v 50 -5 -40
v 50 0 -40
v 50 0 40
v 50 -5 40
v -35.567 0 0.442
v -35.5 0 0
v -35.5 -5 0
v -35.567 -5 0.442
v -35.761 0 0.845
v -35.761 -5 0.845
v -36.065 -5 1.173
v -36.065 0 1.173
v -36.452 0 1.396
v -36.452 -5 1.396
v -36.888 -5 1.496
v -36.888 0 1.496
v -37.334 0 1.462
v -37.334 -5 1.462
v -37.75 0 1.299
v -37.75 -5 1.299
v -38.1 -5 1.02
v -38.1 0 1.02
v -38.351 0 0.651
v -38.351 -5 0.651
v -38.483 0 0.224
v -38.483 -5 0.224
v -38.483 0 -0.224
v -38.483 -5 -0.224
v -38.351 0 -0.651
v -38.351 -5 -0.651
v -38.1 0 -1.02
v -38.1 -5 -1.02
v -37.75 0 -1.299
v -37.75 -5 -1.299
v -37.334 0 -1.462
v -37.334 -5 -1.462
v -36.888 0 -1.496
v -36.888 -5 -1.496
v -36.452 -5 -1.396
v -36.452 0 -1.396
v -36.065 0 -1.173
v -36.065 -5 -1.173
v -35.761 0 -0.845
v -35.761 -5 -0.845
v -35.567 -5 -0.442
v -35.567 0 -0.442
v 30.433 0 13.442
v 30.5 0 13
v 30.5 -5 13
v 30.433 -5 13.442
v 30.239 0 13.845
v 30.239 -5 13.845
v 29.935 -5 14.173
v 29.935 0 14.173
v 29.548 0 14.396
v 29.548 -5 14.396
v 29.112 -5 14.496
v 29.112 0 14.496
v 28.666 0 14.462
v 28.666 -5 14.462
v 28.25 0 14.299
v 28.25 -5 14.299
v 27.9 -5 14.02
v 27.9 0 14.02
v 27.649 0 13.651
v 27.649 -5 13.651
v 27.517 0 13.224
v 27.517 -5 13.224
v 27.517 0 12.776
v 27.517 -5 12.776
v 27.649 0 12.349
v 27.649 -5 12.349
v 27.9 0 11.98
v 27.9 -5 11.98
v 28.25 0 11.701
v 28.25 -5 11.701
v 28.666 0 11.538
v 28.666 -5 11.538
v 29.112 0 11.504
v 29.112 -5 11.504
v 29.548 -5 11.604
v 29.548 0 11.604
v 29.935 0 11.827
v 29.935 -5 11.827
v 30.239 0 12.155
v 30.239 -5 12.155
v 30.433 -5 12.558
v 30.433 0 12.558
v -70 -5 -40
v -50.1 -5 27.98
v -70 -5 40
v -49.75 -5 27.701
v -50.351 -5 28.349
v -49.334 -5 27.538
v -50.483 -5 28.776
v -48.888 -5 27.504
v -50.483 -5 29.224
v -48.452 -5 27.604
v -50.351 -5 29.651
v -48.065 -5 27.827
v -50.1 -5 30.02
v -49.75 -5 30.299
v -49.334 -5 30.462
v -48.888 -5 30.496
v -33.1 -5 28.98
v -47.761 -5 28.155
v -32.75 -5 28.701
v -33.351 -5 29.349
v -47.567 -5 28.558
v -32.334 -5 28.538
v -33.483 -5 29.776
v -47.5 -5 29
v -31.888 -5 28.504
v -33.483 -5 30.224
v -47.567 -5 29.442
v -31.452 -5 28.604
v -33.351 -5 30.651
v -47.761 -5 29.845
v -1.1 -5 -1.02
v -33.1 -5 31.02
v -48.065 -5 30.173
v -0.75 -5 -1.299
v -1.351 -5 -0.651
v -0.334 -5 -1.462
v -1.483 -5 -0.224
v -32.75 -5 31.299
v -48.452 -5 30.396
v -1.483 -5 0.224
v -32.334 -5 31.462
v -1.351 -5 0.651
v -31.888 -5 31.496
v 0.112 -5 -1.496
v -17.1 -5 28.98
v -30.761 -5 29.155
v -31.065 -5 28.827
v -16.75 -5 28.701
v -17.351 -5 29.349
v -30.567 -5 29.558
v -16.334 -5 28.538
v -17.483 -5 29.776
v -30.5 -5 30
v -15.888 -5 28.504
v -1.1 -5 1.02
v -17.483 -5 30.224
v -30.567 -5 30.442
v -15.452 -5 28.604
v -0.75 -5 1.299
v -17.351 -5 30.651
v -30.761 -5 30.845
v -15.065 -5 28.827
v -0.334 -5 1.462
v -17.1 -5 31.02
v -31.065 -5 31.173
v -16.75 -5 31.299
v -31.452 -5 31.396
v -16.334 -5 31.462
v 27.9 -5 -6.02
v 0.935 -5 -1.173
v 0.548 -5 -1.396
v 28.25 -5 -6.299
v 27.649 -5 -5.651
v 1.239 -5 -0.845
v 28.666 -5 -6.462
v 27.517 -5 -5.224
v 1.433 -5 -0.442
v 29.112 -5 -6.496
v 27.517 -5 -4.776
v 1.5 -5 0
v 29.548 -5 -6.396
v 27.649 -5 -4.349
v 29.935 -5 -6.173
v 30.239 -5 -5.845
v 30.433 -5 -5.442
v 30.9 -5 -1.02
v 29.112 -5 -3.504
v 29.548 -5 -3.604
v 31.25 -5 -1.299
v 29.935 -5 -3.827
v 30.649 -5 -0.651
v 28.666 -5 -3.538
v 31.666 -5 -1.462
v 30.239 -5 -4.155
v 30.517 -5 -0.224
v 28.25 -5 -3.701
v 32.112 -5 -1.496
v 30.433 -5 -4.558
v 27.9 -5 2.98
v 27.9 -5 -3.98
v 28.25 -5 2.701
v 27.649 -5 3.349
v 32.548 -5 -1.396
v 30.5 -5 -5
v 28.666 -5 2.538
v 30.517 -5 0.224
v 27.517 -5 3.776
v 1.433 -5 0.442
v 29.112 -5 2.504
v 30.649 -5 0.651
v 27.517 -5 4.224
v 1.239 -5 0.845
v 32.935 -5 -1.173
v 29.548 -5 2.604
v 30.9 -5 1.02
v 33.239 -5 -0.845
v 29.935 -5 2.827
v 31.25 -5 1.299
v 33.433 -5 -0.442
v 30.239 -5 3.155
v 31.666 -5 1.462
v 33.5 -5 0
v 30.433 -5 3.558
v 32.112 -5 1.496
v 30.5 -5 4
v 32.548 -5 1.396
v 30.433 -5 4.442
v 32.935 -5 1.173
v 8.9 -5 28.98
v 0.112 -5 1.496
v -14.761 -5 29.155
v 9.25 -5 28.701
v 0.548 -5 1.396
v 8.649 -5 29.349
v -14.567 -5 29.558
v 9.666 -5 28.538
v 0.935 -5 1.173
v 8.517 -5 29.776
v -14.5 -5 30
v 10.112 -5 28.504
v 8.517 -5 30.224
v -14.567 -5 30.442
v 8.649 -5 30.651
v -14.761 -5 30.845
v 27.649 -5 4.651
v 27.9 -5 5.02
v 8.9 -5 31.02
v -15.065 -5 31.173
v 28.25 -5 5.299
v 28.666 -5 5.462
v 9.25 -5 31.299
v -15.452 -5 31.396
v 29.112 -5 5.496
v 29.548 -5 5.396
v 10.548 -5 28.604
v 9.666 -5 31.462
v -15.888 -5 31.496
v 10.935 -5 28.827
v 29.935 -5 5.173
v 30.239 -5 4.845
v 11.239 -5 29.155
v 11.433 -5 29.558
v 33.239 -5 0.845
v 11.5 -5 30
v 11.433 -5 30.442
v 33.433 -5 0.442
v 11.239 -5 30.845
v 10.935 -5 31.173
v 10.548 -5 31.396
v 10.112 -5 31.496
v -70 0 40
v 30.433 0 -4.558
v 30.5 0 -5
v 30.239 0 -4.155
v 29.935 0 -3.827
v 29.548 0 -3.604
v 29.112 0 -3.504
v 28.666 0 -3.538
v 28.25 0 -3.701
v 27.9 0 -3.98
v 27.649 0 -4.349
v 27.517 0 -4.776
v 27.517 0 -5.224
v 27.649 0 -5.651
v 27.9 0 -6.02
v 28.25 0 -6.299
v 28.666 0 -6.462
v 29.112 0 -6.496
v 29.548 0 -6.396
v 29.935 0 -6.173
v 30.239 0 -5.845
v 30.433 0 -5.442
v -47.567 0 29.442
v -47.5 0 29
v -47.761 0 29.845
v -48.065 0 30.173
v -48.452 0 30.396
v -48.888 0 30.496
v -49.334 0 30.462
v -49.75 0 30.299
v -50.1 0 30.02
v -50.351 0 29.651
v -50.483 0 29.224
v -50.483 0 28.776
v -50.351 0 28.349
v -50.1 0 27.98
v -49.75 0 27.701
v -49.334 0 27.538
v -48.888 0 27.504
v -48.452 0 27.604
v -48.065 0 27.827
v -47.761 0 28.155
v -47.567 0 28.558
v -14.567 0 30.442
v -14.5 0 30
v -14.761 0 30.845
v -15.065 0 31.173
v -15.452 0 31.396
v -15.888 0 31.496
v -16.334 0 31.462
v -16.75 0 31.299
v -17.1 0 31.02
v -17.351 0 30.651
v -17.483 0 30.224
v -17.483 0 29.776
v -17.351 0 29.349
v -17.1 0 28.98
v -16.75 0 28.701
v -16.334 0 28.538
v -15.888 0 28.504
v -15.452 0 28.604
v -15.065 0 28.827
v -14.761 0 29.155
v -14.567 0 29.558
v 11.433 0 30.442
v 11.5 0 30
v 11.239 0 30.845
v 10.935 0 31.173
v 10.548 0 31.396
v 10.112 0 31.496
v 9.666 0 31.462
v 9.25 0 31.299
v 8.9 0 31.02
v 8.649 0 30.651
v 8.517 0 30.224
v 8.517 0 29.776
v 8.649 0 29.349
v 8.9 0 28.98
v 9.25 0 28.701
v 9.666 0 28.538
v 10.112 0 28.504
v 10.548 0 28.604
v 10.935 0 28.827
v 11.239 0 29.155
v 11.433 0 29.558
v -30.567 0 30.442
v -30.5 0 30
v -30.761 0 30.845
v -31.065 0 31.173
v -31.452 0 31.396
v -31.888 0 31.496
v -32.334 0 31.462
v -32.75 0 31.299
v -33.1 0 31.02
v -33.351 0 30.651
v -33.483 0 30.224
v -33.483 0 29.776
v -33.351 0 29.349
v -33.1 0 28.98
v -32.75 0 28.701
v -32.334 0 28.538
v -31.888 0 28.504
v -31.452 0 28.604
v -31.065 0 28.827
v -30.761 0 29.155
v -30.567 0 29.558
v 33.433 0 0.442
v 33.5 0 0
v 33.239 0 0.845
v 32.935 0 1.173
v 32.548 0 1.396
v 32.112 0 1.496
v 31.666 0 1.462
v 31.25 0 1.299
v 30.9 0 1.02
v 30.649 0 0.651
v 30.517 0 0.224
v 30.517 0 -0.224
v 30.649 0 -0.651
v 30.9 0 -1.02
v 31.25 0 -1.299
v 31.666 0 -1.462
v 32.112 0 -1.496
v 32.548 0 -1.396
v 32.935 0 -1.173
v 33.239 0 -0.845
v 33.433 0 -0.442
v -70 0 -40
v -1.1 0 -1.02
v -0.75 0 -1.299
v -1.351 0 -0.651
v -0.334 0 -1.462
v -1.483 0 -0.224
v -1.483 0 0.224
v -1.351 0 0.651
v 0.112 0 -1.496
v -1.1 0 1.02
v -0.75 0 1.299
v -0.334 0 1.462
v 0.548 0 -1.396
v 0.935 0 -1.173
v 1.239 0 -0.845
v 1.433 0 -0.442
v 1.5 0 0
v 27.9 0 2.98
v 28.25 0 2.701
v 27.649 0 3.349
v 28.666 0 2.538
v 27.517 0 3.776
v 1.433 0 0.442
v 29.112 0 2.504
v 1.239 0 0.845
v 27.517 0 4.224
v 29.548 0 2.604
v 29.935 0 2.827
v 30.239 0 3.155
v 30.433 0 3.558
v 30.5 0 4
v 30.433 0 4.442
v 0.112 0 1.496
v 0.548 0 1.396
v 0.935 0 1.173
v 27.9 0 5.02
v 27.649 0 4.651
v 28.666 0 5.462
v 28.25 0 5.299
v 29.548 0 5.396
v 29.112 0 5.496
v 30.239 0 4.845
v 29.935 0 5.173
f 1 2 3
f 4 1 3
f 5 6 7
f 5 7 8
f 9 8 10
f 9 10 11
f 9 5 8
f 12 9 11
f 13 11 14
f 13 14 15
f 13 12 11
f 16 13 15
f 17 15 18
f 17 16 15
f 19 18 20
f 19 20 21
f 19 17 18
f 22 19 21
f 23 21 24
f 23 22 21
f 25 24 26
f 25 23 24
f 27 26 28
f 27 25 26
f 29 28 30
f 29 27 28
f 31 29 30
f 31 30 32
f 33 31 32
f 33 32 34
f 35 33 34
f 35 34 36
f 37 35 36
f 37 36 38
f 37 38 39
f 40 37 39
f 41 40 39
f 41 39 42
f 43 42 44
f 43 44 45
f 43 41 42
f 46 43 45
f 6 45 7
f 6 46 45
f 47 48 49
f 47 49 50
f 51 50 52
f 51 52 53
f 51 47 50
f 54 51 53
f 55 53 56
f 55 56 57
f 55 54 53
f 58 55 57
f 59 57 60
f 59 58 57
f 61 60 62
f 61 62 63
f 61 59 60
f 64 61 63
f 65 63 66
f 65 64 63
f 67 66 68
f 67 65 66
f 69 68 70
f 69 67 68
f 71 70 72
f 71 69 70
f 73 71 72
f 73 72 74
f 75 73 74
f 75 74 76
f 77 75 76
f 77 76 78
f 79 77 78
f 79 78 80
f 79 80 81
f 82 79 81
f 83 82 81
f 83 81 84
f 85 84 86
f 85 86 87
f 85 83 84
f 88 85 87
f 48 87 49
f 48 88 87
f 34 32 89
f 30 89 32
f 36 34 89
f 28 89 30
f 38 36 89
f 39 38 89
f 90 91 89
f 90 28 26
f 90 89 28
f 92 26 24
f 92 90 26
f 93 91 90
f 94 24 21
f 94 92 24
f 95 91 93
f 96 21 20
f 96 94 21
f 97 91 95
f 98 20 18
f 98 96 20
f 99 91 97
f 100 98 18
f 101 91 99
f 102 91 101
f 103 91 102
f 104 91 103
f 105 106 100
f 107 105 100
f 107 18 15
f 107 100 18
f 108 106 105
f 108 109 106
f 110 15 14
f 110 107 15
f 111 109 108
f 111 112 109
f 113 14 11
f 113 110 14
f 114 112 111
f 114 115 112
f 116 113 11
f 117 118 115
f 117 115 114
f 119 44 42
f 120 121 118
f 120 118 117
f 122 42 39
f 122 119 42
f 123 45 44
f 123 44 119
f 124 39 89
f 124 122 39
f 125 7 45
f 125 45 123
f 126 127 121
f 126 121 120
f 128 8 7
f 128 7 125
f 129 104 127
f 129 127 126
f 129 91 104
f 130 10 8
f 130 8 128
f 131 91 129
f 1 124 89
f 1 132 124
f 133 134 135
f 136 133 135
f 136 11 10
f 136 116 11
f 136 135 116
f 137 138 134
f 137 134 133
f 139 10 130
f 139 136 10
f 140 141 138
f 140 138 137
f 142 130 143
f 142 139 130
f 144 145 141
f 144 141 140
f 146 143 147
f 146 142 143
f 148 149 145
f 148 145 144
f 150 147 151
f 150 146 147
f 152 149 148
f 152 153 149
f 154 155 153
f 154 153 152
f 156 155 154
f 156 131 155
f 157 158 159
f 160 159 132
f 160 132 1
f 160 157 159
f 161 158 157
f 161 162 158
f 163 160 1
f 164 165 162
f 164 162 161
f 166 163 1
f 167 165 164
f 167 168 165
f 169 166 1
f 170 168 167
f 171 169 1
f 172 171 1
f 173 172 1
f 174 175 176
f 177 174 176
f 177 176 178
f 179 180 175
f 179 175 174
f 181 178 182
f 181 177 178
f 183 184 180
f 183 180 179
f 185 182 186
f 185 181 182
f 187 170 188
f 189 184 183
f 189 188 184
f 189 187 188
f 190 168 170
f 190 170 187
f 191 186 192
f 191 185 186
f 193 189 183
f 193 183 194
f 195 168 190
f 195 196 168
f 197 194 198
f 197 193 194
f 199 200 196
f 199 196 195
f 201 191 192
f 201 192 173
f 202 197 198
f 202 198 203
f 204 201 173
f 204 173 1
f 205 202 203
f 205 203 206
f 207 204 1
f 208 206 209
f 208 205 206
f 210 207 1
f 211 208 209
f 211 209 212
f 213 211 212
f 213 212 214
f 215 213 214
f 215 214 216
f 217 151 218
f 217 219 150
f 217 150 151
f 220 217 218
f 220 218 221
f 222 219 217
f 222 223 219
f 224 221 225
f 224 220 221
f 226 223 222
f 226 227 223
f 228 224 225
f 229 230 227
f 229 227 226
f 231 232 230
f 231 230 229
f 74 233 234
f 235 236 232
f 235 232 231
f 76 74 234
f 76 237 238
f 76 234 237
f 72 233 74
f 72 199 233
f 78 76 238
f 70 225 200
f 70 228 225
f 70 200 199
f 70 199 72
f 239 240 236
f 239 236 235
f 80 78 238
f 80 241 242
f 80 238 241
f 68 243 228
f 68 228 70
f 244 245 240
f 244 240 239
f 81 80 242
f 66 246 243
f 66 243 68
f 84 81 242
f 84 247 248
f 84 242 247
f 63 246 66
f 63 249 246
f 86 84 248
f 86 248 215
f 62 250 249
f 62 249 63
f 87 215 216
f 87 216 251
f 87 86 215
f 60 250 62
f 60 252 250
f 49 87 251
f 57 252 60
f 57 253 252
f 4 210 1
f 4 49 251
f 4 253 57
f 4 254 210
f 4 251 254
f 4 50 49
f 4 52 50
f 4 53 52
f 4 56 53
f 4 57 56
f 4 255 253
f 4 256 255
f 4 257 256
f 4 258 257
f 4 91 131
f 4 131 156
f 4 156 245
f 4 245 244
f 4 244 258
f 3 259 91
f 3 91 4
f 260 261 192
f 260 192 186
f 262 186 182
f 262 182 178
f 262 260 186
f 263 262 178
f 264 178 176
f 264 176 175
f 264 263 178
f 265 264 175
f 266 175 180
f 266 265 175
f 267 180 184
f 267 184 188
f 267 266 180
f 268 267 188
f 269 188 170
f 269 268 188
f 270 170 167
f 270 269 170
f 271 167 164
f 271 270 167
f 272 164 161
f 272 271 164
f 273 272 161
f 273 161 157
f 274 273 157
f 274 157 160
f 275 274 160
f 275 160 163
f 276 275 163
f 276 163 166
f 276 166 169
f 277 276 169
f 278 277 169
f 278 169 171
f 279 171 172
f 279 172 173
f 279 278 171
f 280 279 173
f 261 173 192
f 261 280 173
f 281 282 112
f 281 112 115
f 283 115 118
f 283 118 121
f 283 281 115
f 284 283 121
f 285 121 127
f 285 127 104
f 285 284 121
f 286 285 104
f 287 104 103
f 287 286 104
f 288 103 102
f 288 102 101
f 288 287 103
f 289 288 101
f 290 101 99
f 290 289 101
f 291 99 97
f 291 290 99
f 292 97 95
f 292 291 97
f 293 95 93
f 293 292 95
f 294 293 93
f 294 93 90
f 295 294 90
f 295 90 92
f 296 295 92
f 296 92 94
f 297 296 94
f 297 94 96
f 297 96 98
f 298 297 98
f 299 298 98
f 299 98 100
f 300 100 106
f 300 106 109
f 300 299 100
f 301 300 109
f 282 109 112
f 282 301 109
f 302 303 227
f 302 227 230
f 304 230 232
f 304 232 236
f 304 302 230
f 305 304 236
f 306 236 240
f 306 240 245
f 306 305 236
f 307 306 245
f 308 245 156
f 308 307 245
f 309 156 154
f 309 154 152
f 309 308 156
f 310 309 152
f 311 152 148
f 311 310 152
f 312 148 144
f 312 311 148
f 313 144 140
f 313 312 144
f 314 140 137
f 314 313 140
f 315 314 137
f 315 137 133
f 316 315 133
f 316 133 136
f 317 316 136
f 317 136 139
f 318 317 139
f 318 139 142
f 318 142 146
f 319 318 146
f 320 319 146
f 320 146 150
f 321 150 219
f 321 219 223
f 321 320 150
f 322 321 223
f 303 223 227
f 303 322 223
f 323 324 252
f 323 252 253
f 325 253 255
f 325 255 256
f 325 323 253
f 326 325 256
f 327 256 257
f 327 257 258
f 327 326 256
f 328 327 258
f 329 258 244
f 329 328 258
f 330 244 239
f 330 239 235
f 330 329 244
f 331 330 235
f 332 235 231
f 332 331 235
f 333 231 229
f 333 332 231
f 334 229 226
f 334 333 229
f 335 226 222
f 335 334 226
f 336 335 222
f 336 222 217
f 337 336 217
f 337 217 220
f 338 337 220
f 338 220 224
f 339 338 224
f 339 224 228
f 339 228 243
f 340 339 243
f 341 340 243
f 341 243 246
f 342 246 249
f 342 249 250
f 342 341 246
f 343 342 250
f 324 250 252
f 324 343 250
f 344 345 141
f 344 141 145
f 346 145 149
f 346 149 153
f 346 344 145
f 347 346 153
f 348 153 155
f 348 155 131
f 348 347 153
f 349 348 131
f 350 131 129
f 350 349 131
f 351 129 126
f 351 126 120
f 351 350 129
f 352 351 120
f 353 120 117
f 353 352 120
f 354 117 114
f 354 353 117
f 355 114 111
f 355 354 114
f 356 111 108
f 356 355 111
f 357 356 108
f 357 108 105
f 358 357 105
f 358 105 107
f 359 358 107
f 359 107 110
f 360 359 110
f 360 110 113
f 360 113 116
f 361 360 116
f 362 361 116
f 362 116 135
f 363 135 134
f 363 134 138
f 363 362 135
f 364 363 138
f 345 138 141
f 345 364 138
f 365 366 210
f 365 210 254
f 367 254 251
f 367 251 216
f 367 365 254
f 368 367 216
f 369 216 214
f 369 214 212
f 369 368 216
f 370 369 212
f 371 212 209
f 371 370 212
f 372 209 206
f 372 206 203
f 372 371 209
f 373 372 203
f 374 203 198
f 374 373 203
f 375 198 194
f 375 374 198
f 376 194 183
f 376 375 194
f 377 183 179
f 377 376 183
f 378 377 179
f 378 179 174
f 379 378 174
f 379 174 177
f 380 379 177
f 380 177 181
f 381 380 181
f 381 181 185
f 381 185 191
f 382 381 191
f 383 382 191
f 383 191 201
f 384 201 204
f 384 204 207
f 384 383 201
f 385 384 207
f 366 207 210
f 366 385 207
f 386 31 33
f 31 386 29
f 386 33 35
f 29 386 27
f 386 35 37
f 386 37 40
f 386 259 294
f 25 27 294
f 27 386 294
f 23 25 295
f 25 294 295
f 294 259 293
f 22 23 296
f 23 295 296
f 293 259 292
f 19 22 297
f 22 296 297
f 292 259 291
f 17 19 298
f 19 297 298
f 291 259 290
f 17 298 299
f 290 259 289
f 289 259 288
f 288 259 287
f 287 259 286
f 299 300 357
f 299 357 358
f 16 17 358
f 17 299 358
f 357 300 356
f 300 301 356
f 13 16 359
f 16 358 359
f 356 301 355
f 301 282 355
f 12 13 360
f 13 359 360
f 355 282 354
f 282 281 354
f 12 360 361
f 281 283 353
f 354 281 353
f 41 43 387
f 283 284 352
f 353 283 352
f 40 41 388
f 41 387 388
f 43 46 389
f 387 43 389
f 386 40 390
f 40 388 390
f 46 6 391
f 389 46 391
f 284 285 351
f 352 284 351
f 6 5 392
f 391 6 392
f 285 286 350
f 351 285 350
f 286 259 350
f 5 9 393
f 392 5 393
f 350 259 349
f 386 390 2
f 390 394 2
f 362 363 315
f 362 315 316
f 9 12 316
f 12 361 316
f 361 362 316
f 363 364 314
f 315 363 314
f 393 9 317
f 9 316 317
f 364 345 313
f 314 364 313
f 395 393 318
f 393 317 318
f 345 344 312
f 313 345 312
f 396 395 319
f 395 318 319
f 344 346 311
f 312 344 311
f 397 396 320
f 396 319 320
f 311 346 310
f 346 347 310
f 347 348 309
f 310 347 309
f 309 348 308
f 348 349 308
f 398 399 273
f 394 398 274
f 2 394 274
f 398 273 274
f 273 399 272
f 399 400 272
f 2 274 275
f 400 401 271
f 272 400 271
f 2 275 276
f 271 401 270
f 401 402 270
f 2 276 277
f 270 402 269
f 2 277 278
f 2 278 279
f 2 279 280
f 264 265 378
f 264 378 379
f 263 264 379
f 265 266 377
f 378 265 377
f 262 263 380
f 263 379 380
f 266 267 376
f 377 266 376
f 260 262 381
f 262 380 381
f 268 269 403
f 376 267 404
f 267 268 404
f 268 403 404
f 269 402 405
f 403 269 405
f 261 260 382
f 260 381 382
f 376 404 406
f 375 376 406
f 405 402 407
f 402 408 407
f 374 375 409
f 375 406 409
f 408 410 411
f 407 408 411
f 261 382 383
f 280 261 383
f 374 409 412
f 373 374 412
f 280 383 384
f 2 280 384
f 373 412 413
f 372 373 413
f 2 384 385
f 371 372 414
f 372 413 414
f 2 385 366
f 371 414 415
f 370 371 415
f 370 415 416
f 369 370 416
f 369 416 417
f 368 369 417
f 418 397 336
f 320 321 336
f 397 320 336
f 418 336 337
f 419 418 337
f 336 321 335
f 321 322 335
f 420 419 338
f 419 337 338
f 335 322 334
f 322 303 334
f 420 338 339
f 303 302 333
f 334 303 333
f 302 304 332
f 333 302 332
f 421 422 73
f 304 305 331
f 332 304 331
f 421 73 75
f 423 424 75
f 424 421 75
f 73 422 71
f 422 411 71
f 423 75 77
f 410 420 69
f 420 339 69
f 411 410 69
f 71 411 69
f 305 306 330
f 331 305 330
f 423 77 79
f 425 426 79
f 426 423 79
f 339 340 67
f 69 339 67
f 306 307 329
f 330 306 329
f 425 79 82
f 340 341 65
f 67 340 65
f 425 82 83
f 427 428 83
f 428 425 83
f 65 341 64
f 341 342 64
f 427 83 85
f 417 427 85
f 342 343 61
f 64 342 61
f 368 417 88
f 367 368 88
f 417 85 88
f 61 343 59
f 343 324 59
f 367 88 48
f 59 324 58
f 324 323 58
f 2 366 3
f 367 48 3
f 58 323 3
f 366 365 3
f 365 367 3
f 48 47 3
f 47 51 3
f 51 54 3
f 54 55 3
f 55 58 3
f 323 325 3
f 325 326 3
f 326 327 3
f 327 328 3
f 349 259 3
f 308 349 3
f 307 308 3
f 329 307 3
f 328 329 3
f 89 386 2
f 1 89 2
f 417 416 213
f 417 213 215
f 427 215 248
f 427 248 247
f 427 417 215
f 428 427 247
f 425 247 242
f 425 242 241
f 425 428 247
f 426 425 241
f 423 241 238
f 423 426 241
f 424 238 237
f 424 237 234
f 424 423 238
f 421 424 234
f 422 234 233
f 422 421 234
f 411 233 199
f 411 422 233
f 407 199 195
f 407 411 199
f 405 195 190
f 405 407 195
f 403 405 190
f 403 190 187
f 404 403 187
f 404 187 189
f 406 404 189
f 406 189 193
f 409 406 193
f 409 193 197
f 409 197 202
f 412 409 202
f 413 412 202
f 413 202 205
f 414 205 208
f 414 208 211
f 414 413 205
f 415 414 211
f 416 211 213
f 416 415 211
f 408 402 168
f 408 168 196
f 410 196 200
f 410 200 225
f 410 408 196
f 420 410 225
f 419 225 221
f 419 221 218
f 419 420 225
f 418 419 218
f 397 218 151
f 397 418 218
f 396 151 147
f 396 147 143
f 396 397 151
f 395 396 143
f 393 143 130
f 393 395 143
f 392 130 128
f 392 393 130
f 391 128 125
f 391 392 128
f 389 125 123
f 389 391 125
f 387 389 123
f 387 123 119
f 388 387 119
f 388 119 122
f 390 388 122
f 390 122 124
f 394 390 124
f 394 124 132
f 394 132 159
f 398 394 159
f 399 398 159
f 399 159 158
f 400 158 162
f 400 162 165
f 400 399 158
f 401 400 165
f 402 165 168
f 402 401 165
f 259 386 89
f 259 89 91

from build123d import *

# Parameters (mm, degrees)
F0_W     = 120
F0_H     = 80
F0_R     = 1.5
F1_DEPTH = 5


with BuildPart() as f1:
    # F0 (on Front) → F1 (new body)
    with BuildSketch(Plane.XZ):
        with Locations((-10, 0)):
            Rectangle(F0_W, F0_H)
        with Locations((29, -5)):
            Circle(F0_R, mode=Mode.SUBTRACT)
        with Locations((-37, 0)):
            Circle(F0_R, mode=Mode.SUBTRACT)
        with Locations((-49, 29)):
            Circle(F0_R, mode=Mode.SUBTRACT)
        with Locations((-32, 30)):
            Circle(F0_R, mode=Mode.SUBTRACT)
        with Locations((-16, 30)):
            Circle(F0_R, mode=Mode.SUBTRACT)
        Circle(F0_R, mode=Mode.SUBTRACT)
        with Locations((32, 0)):
            Circle(F0_R, mode=Mode.SUBTRACT)
        with Locations((29, 4)):
            Circle(F0_R, mode=Mode.SUBTRACT)
        with Locations((29, 13)):
            Circle(F0_R, mode=Mode.SUBTRACT)
        with Locations((10, 30)):
            Circle(F0_R, mode=Mode.SUBTRACT)
    extrude(amount=F1_DEPTH)


solid = f1.part
